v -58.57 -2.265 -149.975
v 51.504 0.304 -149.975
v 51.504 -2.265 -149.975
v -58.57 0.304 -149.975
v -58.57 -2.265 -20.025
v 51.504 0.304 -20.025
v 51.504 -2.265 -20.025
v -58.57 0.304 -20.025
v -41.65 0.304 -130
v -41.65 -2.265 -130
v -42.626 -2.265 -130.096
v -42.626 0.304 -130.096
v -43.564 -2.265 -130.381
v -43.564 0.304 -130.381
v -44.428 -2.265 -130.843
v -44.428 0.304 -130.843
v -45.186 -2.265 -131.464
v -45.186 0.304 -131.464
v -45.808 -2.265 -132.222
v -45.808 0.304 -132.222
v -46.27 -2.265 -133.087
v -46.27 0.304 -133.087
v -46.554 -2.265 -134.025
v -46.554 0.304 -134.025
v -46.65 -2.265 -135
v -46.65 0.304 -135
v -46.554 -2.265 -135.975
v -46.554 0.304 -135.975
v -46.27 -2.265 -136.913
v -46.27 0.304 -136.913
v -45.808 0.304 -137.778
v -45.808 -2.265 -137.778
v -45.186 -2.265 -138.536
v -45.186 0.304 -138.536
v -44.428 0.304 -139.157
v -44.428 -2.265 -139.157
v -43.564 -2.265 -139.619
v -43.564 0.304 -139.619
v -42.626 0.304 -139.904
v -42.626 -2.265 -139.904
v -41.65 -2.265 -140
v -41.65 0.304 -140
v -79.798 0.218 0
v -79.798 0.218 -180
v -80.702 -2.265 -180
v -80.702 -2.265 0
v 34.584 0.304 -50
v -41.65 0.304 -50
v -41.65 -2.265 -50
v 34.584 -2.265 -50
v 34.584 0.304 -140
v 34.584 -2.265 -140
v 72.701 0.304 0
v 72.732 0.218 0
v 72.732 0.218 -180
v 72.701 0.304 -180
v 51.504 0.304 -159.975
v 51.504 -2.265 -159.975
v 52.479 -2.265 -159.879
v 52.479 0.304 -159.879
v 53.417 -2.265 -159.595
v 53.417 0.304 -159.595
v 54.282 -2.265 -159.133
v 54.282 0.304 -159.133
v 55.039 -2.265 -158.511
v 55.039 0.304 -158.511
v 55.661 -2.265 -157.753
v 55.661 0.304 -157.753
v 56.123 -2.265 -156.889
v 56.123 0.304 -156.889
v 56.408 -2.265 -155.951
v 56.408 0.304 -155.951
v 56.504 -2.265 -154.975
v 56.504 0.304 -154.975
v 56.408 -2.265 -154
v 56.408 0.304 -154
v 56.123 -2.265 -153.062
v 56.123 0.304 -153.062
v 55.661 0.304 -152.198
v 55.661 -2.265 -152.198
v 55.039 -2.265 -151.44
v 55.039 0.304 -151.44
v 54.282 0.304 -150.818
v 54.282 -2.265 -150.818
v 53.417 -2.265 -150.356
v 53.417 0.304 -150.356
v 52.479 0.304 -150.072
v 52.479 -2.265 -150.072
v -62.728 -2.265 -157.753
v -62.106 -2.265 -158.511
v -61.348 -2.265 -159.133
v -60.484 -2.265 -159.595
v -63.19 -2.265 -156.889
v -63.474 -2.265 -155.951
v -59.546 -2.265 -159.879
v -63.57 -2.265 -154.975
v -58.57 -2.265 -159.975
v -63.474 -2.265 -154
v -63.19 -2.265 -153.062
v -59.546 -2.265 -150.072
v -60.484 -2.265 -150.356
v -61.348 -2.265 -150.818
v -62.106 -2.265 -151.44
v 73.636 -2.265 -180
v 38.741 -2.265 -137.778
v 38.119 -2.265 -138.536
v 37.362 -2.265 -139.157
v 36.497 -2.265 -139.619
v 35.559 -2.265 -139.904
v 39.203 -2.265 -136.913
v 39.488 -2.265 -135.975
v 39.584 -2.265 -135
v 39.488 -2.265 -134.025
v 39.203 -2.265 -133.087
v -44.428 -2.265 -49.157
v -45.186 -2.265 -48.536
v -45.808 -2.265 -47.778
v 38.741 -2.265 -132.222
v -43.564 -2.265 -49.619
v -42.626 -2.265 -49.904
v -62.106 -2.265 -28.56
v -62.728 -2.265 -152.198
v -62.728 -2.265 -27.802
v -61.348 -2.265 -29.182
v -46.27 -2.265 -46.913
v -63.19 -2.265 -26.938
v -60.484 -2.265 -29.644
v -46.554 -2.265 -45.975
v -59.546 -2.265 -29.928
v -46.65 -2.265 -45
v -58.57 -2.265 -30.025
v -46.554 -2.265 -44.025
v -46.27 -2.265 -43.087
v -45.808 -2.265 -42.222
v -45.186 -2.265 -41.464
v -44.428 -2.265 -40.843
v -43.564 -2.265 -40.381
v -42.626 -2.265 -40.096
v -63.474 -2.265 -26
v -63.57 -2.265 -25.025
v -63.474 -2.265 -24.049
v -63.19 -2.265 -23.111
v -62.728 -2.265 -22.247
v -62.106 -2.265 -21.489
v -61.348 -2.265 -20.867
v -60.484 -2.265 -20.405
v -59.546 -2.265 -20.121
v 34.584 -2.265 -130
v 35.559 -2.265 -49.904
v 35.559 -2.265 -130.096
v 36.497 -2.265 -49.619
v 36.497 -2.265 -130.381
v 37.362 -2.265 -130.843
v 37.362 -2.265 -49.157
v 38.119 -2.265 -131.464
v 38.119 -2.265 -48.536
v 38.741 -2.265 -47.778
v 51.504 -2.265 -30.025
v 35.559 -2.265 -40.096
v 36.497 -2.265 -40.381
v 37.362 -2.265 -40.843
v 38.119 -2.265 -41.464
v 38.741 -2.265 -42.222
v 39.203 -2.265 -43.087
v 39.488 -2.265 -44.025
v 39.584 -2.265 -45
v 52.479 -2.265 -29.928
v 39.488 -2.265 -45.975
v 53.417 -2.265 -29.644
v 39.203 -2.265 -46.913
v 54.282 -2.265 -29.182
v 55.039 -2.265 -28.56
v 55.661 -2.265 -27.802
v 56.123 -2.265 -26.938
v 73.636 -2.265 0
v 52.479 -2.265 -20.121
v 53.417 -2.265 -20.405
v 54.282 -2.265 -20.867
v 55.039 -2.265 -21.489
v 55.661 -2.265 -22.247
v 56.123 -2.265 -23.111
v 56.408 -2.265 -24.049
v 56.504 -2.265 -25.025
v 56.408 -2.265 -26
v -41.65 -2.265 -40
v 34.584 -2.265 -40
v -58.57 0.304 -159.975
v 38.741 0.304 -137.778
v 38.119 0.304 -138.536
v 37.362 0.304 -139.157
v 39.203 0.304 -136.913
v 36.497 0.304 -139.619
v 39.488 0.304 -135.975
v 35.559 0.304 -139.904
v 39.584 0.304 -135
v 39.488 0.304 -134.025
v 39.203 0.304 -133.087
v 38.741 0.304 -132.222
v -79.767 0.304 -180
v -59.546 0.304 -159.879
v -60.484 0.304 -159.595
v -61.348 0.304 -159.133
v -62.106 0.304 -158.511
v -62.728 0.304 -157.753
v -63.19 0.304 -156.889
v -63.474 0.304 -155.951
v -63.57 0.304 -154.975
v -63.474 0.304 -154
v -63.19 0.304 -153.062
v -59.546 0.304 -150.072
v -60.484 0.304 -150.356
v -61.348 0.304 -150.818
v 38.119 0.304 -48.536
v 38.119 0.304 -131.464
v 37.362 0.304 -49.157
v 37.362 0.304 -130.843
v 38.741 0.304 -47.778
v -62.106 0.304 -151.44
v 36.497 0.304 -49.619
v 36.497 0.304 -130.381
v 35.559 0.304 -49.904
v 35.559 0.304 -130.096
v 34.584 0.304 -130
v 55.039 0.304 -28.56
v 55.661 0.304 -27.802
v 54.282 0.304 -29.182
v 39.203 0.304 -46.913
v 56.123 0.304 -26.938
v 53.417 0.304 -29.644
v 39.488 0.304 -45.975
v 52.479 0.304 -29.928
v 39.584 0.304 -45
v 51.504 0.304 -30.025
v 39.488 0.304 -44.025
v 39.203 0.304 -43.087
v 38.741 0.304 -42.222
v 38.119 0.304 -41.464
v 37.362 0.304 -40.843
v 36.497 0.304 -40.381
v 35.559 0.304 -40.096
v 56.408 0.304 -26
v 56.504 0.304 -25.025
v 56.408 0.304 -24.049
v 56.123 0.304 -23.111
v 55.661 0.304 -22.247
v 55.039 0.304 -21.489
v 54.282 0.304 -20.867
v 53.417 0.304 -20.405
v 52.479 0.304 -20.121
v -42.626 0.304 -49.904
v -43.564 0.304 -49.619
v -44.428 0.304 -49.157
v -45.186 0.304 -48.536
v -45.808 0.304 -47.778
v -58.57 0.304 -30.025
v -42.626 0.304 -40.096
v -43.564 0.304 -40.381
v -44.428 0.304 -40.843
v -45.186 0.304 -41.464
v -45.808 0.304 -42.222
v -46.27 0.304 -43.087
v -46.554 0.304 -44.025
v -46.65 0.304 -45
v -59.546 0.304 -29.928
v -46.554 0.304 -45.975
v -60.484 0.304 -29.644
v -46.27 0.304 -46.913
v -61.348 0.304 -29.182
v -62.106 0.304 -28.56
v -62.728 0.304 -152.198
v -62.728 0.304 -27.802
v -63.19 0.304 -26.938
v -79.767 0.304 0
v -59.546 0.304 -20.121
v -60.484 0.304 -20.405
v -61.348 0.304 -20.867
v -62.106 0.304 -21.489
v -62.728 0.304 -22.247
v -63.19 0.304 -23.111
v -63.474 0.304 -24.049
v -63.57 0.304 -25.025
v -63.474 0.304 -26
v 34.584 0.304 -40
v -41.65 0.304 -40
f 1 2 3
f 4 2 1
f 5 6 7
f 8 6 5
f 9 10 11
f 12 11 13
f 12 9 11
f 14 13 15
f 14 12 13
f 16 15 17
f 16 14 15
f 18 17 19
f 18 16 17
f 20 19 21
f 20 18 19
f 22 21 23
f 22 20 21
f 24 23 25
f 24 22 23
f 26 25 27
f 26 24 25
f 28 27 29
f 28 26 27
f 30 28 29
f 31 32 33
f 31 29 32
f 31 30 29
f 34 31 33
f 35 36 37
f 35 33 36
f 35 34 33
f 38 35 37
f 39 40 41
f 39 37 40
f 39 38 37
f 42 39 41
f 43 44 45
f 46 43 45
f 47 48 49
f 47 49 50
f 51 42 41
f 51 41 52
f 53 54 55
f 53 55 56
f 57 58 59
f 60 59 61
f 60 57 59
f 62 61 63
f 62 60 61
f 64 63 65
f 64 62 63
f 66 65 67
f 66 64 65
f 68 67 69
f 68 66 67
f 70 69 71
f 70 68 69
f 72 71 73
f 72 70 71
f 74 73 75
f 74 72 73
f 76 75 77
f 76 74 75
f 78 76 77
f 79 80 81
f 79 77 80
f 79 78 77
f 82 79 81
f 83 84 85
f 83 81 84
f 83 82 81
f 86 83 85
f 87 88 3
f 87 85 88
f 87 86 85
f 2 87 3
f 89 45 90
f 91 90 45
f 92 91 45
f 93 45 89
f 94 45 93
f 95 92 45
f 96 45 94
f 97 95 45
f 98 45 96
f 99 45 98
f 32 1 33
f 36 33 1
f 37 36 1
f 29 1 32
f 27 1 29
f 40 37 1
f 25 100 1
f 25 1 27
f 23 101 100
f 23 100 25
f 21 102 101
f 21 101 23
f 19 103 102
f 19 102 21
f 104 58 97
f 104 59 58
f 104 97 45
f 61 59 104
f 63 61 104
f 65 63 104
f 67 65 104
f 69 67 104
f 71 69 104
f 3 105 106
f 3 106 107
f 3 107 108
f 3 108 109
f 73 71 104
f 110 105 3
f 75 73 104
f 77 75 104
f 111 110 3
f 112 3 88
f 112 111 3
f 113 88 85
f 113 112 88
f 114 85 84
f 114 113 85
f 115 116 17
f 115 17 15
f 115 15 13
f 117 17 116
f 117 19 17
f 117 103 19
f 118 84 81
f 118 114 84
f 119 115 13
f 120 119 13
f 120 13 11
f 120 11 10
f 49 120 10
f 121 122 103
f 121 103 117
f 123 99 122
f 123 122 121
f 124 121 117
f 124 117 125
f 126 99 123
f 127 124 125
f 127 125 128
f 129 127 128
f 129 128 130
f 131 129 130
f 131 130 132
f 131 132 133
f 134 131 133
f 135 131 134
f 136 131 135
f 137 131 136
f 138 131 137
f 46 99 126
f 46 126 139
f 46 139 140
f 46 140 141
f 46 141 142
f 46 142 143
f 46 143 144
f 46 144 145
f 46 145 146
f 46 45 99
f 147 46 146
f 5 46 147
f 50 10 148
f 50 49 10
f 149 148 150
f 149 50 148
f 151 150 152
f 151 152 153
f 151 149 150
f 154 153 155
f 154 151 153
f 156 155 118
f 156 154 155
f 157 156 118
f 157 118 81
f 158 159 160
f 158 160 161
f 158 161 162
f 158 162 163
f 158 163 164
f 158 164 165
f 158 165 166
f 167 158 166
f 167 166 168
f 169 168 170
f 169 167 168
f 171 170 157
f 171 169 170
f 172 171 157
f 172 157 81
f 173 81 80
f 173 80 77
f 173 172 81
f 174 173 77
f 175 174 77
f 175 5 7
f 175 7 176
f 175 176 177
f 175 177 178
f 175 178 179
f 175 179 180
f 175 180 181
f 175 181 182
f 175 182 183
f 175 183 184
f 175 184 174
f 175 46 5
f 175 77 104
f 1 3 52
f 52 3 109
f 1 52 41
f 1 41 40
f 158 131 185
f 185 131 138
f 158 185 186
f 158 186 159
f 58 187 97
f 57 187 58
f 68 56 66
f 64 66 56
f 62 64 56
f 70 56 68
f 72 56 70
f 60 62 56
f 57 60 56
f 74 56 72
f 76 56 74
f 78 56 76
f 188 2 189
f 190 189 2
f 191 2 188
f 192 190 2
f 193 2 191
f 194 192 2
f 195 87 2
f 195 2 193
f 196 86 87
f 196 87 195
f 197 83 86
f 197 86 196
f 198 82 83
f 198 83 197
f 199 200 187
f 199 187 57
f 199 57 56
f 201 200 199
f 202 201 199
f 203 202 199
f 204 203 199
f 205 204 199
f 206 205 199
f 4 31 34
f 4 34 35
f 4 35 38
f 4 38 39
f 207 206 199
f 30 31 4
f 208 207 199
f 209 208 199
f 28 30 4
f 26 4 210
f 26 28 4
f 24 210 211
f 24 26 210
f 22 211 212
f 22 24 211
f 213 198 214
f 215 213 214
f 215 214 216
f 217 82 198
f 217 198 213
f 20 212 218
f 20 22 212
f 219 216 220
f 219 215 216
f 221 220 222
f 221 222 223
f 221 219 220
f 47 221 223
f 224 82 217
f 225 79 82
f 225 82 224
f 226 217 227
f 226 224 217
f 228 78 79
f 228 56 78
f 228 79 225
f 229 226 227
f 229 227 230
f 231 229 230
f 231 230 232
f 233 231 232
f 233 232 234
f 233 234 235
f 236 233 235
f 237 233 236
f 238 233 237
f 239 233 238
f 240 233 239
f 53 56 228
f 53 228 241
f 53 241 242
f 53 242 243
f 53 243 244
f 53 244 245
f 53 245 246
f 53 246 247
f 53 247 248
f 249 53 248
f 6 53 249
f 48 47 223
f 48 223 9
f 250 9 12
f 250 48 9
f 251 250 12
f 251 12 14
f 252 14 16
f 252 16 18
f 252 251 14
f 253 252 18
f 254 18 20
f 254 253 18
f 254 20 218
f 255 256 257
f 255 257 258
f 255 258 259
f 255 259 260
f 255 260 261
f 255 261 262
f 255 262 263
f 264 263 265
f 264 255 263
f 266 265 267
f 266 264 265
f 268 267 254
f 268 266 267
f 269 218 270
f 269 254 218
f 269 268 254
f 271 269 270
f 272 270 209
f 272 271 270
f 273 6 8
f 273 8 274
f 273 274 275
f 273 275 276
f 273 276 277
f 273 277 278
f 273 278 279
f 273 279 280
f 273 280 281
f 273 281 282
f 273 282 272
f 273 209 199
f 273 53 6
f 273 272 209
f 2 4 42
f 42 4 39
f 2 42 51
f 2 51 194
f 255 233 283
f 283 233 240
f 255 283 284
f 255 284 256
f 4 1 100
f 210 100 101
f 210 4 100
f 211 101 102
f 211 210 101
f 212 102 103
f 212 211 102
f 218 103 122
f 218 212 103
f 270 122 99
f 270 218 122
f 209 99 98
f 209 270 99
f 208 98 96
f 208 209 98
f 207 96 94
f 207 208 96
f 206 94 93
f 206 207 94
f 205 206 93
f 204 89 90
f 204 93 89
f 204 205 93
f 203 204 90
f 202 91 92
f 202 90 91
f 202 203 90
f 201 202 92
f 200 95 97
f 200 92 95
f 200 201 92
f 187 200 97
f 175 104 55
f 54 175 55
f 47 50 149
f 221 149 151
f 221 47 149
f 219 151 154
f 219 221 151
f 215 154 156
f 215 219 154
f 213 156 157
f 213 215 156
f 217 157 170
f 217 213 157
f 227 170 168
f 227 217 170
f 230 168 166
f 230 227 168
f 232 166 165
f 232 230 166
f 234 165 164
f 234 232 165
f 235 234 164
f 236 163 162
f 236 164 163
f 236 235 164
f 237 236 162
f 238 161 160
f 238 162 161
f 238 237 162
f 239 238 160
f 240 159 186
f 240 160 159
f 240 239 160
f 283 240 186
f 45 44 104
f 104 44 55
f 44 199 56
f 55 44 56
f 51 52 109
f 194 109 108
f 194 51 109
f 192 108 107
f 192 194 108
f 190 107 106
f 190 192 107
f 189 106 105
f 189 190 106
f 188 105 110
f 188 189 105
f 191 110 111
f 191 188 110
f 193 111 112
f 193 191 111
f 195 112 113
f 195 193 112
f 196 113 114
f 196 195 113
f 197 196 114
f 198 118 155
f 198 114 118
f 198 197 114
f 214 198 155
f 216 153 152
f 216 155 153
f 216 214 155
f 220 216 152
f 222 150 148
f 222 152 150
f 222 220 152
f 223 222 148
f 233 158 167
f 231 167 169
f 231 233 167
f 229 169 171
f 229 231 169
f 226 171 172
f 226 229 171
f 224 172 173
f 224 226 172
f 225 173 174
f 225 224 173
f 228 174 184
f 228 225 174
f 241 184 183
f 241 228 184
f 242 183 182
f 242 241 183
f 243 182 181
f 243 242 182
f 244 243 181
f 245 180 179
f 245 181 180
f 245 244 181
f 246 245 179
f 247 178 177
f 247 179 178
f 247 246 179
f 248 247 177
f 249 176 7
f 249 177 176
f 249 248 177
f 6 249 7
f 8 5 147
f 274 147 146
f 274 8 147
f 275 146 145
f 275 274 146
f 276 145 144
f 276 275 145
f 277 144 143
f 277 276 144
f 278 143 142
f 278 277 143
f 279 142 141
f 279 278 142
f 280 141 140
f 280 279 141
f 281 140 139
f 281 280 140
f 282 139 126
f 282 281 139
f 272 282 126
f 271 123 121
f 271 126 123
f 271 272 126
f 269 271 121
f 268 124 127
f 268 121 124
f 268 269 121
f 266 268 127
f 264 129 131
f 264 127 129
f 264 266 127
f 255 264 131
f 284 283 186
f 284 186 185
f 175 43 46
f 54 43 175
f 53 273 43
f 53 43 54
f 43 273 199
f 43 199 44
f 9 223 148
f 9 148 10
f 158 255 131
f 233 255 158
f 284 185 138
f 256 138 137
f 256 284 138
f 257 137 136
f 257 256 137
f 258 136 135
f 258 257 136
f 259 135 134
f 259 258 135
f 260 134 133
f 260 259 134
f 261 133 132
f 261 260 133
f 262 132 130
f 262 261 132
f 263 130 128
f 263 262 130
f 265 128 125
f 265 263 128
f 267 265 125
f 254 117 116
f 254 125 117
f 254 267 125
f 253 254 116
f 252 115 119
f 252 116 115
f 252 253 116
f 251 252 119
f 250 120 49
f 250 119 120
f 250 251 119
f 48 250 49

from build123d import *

# Parameters (mm, degrees)
BOSS_EXTRUDE1_DEPTH = 180
CUT_EXTRUDE1_DEPTH  = 3


with BuildPart() as part:
    # Sketch1 → Boss-Extrude1 (new body)
    with BuildSketch(Plane.XY):
        Polygon((-79.798311646, 0.218218313), (-80.70225823, -2.265354514), (73.635788627, -2.265354514), (72.731842043, 0.218218313), (72.700720755, 0.303723349), (72.541884773, 0.303723349), (-79.767190358, 0.303723349), align=None)
    extrude(amount=-BOSS_EXTRUDE1_DEPTH)

    # Sketch2 → Cut-Extrude1 (cut)
    with BuildSketch(Plane(origin=(0, 0.303723349, 0), x_dir=(1, 0, 0), z_dir=(0, 1, 0))):
        with BuildLine():
            Line((-41.65021258, 50), (34.583742977, 50))
            ThreePointArc((34.583742977, 50), (39.583742977, 45), (34.583742977, 40))
            Line((34.583742977, 40), (-41.65021258, 40))
            ThreePointArc((-41.65021258, 40), (-46.65021258, 45), (-41.65021258, 50))
        make_face()
        with BuildLine():
            Line((-56.99562327, 30.024566053), (51.503813463, 30.024566053))
            ThreePointArc((51.503813463, 30.024566053), (56.503813463, 25.024566053), (51.503813463, 20.024566053))
            Line((51.503813463, 20.024566053), (-58.570283066, 20.024566053))
            ThreePointArc((-58.570283066, 20.024566053), (-63.570283066, 25.024566053), (-58.570283066, 30.024566053))
            Line((-58.570283066, 30.024566053), (-56.99562327, 30.024566053))
        make_face()
        with BuildLine():
            Line((-56.99562327, 149.975433947), (-58.570283066, 149.975433947))
            ThreePointArc((-58.570283066, 149.975433947), (-63.570283066, 154.975433947), (-58.570283066, 159.975433947))
            Line((-58.570283066, 159.975433947), (51.503813463, 159.975433947))
            ThreePointArc((51.503813463, 159.975433947), (56.503813463, 154.975433947), (51.503813463, 149.975433947))
            Line((51.503813463, 149.975433947), (-56.99562327, 149.975433947))
        make_face()
        with BuildLine():
            Line((-41.65021258, 140), (34.583742977, 140))
            ThreePointArc((34.583742977, 140), (39.583742977, 135), (34.583742977, 130))
            Line((34.583742977, 130), (-41.65021258, 130))
            ThreePointArc((-41.65021258, 130), (-46.65021258, 135), (-41.65021258, 140))
        make_face()
    extrude(amount=-CUT_EXTRUDE1_DEPTH, mode=Mode.SUBTRACT)


solid = part.part
